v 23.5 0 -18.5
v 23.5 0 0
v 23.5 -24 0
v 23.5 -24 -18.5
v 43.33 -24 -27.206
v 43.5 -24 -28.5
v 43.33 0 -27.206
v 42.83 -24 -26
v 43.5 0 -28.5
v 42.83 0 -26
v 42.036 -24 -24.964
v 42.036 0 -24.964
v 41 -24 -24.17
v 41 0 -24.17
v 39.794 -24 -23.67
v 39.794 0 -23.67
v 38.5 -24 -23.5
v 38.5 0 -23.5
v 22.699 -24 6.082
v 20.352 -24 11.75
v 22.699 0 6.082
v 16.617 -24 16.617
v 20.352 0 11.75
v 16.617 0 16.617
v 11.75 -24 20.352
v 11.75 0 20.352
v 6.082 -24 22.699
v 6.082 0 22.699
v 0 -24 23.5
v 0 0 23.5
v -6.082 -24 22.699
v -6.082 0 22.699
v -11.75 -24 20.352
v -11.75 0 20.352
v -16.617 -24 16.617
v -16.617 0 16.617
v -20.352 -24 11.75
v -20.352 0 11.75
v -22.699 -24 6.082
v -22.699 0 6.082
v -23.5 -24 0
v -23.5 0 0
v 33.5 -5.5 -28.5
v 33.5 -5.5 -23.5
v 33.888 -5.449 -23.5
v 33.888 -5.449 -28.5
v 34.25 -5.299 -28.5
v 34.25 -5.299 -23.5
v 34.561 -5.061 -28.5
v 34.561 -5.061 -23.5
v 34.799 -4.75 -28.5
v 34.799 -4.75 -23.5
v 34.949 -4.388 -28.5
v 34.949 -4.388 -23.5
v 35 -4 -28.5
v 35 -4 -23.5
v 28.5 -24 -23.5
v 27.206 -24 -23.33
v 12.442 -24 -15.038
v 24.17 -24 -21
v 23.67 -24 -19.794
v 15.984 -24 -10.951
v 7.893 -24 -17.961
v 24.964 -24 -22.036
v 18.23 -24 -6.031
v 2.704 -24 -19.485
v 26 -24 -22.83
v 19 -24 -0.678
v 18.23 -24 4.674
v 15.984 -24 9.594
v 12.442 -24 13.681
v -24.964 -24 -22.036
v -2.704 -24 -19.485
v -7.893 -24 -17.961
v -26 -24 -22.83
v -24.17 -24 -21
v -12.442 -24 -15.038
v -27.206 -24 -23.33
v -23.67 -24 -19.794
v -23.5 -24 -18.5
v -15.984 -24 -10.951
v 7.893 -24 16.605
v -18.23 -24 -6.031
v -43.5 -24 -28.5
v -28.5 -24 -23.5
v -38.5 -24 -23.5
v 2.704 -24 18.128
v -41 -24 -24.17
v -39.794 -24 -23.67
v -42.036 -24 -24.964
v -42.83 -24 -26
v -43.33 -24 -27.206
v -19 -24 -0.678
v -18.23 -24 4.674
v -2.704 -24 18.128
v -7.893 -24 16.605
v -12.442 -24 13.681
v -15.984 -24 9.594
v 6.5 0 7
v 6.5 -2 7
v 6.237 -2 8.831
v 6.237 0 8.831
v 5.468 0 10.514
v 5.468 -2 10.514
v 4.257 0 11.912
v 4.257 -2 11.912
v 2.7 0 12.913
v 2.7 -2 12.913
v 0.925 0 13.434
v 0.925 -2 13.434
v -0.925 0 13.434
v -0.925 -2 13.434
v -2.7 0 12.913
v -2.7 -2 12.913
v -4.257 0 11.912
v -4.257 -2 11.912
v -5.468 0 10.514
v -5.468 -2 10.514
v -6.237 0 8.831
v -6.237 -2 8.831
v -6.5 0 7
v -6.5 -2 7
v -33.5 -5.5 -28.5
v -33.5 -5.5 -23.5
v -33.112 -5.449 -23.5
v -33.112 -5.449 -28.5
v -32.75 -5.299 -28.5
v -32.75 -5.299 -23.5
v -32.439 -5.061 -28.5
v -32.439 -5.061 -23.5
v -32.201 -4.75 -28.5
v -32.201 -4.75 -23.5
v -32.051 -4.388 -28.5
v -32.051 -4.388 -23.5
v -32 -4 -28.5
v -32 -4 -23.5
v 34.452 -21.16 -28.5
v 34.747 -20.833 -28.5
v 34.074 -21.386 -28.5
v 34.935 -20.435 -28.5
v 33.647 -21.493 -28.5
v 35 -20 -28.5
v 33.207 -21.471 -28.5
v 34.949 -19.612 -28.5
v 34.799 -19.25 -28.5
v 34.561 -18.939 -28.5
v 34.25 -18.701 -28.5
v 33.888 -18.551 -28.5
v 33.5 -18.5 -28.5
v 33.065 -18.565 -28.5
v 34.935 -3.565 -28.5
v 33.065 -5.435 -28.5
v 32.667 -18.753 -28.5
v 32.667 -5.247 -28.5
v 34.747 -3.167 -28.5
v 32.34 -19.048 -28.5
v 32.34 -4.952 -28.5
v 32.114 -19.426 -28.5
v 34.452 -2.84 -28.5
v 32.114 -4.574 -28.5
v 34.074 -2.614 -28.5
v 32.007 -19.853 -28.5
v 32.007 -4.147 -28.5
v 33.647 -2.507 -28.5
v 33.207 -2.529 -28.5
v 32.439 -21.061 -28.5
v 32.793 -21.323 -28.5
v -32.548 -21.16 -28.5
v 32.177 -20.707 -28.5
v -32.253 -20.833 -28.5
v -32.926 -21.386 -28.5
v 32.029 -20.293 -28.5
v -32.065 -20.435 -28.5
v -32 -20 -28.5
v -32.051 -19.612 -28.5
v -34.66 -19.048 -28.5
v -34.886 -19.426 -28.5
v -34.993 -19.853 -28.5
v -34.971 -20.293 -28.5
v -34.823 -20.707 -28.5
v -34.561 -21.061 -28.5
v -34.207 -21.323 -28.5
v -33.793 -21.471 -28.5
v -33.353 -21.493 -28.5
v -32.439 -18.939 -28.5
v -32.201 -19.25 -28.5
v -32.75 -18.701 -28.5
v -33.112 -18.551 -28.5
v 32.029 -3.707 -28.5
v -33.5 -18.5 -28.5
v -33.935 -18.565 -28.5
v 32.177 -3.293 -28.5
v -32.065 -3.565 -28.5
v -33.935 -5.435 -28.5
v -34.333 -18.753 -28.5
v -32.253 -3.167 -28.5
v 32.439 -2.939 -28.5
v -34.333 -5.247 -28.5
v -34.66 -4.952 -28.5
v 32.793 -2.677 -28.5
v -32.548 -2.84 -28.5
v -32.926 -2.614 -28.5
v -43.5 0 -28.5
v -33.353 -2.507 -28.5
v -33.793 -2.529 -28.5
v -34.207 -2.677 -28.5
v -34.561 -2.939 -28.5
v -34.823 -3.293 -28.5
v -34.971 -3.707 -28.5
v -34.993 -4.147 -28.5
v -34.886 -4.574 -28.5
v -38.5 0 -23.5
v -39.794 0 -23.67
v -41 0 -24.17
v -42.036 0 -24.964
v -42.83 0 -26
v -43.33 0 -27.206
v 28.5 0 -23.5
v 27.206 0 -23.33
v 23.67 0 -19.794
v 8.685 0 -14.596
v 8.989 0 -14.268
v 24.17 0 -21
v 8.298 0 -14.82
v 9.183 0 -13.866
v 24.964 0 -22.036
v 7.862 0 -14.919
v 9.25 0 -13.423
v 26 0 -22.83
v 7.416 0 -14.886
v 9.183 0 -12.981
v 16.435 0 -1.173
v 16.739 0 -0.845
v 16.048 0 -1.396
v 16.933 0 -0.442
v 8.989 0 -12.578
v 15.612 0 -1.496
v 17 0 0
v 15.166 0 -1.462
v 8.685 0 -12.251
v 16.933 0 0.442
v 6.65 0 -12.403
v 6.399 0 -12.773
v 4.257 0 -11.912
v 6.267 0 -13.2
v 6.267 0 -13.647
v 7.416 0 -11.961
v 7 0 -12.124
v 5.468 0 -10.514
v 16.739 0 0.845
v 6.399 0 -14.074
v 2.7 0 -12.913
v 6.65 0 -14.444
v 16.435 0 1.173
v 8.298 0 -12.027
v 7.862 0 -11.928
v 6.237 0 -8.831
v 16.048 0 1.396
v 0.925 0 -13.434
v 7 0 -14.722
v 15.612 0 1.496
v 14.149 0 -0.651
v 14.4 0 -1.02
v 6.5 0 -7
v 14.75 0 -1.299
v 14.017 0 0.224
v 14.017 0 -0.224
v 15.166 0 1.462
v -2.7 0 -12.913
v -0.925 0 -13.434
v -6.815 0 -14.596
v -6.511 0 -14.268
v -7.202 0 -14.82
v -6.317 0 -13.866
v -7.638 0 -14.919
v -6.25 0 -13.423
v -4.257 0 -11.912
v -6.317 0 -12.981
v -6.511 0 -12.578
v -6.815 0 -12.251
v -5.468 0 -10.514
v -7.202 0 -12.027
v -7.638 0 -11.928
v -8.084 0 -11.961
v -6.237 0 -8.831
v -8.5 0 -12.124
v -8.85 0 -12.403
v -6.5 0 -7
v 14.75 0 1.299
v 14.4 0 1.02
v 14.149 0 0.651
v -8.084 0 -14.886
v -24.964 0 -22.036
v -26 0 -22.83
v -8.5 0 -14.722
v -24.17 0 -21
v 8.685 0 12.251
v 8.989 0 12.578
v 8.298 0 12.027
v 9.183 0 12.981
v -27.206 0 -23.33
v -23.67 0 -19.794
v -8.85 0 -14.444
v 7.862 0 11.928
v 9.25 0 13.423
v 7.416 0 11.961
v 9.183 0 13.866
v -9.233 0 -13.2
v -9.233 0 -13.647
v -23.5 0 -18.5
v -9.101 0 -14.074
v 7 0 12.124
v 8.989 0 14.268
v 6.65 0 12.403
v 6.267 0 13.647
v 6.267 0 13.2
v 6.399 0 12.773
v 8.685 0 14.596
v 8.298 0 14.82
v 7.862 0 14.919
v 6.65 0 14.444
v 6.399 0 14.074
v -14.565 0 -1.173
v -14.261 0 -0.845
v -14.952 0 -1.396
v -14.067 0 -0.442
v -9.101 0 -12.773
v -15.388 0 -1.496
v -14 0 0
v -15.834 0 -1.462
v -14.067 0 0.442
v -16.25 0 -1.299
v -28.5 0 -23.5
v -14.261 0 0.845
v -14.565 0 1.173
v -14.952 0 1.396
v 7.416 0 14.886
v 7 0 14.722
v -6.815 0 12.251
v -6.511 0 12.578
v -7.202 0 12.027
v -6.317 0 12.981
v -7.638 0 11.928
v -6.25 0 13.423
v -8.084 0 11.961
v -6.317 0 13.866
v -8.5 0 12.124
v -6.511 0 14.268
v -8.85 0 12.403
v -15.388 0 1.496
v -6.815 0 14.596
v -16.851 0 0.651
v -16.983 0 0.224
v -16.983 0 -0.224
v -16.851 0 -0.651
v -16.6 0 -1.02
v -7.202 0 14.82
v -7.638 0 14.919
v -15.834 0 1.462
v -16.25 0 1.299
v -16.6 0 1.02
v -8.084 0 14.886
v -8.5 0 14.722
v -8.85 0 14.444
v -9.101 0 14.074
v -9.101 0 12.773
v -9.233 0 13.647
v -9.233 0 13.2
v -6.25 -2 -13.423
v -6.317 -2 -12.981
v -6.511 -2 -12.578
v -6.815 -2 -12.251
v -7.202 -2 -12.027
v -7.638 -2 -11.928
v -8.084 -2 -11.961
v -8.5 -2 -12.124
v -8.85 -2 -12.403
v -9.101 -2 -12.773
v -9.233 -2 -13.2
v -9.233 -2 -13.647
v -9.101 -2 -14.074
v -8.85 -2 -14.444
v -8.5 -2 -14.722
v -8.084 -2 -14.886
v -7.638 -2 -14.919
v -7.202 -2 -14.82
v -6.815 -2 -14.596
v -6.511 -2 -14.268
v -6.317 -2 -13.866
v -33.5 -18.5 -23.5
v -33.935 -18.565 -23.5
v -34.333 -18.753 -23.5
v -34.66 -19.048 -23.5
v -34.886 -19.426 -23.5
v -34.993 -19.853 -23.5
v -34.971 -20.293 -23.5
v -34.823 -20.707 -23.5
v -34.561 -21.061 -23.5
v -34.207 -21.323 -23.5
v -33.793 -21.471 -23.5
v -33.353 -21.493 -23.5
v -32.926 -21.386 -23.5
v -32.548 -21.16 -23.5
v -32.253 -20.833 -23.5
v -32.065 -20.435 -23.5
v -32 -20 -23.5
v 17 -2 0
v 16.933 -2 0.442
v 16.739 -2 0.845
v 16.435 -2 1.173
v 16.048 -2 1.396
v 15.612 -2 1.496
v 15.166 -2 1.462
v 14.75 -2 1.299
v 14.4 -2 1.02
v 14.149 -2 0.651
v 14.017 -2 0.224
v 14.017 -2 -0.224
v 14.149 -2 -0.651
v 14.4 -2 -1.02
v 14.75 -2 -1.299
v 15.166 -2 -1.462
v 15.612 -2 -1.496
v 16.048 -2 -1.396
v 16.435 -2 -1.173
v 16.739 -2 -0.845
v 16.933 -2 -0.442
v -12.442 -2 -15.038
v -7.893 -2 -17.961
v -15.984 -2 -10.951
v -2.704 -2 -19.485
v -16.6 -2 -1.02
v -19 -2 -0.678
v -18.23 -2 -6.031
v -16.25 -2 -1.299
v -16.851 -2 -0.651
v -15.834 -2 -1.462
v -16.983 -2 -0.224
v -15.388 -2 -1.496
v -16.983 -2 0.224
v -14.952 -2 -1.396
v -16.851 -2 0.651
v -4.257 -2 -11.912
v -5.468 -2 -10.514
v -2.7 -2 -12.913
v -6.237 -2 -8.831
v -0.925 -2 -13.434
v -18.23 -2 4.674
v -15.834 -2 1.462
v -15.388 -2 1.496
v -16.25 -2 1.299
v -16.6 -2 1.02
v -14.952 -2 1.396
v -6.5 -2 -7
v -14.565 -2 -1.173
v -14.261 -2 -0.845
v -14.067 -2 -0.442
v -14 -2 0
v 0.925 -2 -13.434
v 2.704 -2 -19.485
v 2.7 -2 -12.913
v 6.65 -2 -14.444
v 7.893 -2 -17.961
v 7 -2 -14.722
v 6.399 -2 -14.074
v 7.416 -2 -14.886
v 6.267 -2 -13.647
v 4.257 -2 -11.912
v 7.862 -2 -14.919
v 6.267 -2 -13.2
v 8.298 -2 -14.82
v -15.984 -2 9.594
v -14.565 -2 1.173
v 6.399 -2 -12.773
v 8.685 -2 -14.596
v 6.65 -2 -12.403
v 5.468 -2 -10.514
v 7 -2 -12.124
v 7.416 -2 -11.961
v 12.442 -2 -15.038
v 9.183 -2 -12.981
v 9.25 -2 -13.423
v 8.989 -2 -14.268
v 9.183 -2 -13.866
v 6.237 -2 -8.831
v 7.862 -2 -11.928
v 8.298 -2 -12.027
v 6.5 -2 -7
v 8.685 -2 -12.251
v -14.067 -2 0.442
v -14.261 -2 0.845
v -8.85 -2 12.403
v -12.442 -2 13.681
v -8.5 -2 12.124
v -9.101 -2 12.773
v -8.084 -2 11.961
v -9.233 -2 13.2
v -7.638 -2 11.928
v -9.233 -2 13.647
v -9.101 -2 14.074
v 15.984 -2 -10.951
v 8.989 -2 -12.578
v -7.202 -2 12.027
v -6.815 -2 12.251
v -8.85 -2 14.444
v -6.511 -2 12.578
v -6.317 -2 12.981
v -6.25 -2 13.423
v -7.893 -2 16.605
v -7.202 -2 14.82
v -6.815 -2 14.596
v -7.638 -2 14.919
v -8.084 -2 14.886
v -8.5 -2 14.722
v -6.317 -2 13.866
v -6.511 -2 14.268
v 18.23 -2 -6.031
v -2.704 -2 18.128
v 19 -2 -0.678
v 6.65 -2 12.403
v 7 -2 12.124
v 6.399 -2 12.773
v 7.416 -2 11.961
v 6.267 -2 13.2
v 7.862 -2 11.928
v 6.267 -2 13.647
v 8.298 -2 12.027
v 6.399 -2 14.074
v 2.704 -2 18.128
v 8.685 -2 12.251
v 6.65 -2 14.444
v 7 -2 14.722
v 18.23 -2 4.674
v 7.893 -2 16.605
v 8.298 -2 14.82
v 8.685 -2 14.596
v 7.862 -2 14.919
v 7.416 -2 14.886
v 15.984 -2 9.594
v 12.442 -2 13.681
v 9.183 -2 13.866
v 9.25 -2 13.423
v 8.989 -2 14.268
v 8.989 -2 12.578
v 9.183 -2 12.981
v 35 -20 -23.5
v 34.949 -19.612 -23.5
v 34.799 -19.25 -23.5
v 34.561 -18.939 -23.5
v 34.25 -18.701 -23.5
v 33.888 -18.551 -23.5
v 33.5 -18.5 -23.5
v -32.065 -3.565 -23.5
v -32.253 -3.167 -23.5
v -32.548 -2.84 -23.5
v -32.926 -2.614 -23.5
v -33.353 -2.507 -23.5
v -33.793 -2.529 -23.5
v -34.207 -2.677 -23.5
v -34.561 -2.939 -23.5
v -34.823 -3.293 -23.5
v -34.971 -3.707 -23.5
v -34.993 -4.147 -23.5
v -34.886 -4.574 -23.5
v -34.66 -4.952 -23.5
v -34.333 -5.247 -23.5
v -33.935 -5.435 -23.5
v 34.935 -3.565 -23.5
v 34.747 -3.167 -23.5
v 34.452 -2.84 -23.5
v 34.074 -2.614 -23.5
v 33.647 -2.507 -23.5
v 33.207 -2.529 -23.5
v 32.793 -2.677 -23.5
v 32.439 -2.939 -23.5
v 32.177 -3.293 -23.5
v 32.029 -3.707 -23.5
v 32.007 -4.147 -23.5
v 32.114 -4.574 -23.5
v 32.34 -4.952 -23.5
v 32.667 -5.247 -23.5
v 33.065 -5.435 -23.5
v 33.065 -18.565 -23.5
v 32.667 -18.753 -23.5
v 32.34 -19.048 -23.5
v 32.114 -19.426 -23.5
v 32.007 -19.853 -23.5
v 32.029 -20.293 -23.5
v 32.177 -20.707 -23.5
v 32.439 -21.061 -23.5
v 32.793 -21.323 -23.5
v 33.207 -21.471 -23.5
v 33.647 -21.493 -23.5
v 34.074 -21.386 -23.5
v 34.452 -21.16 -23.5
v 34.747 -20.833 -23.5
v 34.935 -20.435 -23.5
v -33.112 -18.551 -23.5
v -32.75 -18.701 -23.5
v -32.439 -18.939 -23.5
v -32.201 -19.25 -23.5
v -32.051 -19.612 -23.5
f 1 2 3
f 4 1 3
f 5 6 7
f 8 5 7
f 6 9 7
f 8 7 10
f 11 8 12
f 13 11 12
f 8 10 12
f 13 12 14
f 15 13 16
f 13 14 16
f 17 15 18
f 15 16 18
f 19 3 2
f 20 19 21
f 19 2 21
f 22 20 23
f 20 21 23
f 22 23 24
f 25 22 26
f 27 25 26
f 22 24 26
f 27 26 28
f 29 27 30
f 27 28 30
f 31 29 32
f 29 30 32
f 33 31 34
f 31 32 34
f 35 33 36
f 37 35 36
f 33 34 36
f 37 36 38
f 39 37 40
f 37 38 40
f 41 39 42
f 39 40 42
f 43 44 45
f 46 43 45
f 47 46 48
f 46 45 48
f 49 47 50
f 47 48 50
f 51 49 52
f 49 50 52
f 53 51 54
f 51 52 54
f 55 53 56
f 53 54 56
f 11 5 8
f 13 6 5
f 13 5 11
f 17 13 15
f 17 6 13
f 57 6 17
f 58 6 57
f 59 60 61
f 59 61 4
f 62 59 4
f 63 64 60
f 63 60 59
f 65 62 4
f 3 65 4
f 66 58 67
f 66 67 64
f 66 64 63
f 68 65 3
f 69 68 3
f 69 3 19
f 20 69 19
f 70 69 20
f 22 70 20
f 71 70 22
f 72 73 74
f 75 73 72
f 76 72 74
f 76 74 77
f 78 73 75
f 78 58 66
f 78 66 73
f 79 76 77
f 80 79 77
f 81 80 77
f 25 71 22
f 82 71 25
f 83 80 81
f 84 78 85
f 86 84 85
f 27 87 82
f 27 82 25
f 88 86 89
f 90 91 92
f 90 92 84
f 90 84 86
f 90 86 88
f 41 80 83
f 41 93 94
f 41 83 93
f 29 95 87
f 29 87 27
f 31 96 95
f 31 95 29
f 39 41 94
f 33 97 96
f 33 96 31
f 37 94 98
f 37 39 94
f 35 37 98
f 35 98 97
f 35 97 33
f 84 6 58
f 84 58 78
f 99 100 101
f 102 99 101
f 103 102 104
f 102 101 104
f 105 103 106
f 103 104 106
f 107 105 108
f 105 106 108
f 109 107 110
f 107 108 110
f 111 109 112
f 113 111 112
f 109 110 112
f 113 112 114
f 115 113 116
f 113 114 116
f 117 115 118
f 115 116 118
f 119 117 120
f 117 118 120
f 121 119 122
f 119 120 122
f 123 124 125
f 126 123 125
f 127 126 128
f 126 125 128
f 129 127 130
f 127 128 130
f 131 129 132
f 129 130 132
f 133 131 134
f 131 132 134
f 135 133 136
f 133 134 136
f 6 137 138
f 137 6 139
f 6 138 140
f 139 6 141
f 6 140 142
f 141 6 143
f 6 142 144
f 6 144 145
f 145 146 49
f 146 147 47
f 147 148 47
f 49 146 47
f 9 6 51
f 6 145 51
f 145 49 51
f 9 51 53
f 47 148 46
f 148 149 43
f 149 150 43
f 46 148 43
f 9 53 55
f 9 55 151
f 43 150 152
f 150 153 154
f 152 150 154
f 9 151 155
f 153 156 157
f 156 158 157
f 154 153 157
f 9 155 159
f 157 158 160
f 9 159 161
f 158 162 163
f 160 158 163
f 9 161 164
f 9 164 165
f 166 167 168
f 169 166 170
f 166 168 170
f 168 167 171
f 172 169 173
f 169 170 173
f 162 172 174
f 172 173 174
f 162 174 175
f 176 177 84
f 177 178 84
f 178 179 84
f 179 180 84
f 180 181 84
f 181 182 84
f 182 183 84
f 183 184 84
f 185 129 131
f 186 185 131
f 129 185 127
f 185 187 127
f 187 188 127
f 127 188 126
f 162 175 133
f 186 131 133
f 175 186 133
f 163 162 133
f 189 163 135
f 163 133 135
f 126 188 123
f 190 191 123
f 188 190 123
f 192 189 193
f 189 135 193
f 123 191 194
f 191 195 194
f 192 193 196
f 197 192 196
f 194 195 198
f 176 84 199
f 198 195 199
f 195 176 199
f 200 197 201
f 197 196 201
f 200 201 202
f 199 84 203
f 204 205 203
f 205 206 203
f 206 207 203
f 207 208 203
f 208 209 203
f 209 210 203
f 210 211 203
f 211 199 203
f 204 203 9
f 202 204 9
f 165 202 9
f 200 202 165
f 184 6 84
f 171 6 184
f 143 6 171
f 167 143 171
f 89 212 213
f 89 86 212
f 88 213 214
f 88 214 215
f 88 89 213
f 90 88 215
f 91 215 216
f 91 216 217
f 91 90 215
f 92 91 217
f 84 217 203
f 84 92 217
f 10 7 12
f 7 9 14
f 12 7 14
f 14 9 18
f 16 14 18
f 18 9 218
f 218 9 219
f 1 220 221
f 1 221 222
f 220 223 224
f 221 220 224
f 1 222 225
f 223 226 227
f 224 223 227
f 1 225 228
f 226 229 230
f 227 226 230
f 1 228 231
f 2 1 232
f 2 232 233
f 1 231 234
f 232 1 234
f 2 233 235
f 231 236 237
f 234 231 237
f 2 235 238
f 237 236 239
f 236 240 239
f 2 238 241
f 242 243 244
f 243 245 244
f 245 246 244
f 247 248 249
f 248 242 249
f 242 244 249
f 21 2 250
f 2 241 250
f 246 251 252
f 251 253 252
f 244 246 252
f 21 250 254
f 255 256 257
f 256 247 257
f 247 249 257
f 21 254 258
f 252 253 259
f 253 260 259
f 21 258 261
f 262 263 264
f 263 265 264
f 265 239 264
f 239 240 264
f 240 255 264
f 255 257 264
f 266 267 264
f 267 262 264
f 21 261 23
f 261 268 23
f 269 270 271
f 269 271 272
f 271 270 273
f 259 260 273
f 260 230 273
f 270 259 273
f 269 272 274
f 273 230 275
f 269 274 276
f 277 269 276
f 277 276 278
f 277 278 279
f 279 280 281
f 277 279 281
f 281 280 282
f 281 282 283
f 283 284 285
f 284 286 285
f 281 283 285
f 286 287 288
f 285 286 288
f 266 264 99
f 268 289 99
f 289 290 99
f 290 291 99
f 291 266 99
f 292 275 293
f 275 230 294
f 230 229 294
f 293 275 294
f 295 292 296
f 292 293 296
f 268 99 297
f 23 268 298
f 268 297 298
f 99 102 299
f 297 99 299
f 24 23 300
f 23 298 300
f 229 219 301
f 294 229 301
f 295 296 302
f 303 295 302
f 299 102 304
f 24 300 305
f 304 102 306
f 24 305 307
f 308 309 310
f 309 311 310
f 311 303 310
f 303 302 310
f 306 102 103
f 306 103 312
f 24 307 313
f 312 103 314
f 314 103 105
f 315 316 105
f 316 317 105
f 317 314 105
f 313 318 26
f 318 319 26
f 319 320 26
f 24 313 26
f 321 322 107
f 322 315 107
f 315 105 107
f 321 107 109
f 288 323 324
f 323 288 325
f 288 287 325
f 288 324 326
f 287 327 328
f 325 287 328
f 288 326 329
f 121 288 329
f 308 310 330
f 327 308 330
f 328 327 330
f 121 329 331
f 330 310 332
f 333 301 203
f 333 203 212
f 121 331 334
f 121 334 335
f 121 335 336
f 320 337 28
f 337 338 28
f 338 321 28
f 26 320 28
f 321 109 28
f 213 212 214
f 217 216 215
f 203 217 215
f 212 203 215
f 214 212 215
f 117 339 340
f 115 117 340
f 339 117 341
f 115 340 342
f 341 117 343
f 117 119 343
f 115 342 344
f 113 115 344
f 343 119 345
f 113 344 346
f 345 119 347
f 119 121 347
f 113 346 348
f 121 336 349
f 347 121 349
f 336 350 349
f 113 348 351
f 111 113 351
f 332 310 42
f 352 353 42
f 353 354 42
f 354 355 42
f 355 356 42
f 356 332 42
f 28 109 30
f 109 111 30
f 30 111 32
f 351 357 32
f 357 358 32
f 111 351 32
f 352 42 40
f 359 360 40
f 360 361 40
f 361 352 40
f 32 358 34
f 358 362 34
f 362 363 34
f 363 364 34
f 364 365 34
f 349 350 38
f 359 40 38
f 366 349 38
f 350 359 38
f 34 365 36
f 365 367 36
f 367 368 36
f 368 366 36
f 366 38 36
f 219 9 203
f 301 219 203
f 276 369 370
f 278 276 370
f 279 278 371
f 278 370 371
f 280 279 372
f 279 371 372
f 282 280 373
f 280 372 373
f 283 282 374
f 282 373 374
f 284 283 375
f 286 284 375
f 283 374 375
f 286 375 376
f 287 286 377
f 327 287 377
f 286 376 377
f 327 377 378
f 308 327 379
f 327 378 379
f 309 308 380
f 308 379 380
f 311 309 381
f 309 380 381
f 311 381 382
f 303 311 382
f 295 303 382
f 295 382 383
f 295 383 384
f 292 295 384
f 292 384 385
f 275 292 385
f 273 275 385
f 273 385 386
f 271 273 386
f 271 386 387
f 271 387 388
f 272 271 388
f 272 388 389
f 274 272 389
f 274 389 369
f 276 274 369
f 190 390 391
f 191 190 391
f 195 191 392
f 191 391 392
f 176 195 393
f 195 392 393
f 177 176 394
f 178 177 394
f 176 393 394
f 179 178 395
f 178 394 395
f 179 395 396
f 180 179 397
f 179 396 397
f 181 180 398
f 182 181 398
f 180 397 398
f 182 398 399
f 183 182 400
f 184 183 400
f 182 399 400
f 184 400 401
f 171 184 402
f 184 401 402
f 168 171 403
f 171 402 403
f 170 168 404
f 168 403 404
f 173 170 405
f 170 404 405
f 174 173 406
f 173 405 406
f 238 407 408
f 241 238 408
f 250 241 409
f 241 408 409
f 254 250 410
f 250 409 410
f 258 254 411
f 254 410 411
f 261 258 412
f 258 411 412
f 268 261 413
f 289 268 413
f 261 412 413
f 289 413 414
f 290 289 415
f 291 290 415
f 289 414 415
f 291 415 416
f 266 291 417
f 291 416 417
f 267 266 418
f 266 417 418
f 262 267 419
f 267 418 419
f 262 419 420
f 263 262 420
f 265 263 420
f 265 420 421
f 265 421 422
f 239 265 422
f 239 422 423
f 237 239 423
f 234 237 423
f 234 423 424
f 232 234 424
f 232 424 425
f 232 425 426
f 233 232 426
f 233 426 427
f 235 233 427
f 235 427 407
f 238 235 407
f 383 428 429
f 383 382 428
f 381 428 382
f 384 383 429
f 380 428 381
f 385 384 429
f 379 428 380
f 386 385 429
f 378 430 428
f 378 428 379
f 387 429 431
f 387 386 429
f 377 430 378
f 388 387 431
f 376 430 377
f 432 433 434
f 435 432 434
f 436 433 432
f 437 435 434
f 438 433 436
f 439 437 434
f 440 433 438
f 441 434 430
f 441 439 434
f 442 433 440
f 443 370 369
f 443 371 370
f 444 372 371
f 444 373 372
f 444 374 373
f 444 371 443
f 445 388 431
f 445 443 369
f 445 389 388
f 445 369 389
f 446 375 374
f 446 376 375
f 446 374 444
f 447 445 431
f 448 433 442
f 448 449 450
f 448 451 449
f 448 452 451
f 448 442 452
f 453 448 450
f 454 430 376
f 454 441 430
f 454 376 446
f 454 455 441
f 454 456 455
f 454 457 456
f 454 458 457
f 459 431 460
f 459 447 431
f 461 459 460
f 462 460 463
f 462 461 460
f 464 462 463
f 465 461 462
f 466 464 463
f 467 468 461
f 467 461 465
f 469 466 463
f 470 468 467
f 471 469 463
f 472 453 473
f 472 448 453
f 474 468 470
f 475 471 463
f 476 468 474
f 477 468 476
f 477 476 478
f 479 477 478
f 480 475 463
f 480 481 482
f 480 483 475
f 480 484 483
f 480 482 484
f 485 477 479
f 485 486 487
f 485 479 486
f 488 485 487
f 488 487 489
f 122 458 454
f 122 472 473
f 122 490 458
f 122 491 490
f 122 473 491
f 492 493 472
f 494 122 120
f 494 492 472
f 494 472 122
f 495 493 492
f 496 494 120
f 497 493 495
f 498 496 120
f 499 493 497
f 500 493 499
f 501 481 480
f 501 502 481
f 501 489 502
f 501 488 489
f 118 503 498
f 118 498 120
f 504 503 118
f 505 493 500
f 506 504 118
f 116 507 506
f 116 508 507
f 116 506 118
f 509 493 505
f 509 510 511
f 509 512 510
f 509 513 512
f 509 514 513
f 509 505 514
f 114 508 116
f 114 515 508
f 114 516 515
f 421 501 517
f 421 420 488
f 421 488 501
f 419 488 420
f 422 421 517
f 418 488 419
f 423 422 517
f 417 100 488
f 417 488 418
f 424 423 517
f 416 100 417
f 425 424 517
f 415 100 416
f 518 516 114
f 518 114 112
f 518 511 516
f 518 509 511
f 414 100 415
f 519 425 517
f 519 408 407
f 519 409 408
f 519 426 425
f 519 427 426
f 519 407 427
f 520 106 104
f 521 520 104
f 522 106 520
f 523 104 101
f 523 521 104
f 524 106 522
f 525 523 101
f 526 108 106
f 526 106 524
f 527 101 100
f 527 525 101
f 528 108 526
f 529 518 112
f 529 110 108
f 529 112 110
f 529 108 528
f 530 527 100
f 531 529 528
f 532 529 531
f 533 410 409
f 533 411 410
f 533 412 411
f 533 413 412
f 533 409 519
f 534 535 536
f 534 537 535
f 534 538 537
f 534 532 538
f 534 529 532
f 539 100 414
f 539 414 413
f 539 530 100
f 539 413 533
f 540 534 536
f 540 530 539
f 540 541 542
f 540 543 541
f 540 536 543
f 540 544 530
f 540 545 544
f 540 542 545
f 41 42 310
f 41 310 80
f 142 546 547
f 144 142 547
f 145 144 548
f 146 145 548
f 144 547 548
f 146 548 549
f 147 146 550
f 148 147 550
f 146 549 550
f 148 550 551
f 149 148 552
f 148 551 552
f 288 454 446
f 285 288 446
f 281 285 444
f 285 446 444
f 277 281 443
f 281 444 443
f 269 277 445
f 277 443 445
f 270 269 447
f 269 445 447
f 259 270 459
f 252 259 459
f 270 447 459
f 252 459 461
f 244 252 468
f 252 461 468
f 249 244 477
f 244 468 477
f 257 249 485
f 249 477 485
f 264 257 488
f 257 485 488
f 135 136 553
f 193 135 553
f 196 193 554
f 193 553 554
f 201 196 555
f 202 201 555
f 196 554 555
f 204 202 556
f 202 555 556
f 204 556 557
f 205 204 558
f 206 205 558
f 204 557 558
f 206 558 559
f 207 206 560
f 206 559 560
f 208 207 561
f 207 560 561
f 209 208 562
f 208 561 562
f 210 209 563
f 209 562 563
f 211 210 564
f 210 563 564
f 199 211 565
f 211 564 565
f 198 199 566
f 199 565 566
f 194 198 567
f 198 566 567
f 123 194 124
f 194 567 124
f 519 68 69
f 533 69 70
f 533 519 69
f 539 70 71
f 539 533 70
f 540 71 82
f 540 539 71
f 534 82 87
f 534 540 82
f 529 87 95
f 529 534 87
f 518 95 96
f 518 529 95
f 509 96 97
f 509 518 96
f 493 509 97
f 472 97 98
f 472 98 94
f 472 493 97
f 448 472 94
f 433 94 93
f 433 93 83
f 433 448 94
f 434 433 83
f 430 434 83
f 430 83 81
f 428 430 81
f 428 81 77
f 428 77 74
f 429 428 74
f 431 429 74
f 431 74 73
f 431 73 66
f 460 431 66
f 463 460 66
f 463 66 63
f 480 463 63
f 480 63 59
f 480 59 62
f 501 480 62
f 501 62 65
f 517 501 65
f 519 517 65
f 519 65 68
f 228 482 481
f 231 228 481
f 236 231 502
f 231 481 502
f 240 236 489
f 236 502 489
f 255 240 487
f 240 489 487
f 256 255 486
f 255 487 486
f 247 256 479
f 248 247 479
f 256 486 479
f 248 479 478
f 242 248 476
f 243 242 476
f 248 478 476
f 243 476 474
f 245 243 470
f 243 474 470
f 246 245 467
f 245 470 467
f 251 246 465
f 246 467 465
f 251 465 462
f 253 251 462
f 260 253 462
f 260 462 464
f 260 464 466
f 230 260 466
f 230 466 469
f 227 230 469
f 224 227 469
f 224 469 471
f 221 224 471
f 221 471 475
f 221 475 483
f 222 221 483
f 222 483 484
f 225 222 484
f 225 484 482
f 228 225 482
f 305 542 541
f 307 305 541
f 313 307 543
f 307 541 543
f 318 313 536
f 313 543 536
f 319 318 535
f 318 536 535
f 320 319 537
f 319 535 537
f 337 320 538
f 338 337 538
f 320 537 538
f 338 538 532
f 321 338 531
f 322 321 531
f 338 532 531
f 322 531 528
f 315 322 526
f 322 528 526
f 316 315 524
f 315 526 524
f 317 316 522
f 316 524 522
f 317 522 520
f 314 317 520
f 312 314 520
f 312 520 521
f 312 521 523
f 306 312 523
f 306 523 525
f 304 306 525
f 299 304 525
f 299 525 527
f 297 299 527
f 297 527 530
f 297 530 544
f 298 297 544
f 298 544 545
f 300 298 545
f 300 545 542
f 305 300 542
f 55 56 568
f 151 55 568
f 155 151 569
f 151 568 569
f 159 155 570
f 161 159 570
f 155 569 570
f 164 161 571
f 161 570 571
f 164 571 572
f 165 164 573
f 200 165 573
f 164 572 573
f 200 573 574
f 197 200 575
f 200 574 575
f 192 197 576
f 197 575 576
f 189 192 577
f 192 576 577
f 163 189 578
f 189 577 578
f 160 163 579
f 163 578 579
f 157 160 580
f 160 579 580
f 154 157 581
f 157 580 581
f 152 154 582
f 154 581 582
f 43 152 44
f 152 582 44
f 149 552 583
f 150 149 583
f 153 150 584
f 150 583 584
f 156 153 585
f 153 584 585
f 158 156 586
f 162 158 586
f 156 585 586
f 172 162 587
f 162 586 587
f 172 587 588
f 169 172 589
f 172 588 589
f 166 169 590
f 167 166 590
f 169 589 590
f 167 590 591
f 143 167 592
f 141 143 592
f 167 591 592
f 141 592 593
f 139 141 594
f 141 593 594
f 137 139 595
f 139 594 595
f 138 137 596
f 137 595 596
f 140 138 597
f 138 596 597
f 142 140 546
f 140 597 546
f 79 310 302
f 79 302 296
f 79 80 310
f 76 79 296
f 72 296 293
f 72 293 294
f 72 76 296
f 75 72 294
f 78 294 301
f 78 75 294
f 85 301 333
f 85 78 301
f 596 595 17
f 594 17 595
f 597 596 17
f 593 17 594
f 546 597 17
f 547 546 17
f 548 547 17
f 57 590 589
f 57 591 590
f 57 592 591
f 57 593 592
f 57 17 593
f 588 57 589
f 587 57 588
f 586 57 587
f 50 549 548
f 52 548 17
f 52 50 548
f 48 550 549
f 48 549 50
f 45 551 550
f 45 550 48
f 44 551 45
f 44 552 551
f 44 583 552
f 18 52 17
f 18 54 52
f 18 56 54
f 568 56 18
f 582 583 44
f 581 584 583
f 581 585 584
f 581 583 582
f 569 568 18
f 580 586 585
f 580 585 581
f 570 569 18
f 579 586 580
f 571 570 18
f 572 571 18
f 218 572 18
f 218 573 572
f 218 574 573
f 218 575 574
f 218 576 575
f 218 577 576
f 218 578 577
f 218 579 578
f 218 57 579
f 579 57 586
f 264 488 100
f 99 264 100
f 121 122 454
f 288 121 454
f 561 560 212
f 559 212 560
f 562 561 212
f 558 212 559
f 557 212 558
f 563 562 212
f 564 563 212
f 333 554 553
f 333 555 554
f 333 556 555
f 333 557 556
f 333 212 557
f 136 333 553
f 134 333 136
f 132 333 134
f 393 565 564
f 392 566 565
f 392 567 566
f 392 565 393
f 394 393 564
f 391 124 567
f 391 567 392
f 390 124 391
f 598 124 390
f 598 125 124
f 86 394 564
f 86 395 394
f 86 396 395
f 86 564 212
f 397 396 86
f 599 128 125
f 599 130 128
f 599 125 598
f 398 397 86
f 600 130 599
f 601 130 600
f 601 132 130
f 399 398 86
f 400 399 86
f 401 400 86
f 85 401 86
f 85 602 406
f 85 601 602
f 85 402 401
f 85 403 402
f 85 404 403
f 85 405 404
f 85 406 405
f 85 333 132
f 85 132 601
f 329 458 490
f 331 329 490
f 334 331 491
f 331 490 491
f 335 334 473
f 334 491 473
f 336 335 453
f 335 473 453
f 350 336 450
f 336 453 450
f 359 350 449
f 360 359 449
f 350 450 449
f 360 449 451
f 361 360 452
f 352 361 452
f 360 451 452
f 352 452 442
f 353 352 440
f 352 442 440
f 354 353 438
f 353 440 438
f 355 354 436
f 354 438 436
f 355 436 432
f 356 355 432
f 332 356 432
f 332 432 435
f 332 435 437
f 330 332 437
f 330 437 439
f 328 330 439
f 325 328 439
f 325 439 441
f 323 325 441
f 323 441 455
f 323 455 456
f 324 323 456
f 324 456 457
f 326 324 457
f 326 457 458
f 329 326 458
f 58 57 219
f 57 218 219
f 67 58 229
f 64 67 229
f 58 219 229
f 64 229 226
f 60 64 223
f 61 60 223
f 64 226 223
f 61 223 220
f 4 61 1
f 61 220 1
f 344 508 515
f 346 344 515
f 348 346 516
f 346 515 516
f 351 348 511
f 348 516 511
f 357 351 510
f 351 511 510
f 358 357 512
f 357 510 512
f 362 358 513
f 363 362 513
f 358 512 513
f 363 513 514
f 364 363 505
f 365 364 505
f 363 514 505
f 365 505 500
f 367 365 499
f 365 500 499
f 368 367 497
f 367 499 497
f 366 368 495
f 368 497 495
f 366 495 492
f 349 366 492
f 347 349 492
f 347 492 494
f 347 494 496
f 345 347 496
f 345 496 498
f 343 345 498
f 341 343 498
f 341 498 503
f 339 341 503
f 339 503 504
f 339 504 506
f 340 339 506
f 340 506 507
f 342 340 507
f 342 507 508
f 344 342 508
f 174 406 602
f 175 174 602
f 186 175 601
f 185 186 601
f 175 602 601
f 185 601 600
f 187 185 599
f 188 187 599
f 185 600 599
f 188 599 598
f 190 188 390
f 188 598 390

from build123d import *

# Parameters (mm, degrees)
F1_DEPTH  = 2
F2_R      = 1.5
F3_DEPTH  = 5
F4_R      = 19
F5_DEPTH  = 24
F6_W      = 47
F6_H      = 24
F7_DEPTH  = 5
F8_W      = 24
F8_H      = 5
F9_DEPTH  = 20
F11_DEPTH = 25
F12_W     = 24
F12_H     = 5
F13_DEPTH = 20
F15_DEPTH = 25
F16_R     = 4.99999


# Not quite as in the source:
# - a fillet or chamfer is up to 0.001 mm smaller than in the source, because OpenCascade refuses the exact size


with BuildPart() as f1:
    # F0 (on Front) → F1 (new body)
    with BuildSketch(Plane.XZ):
        with BuildLine():
            Line((-23.5, -23.5), (0, -23.5))
            Line((0, -23.5), (23.5, -23.5))
            Line((23.5, -23.5), (23.5, 0))
            ThreePointArc((23.5, 0), (0, 23.5), (-23.5, 0))
            Line((-23.5, 0), (-23.5, -23.5))
        make_face()
    extrude(amount=F1_DEPTH)

    # F2 (on face) → F3 (cut)
    with BuildSketch(Plane.XZ.offset(2)):
        with Locations((15.5, 0)):
            Circle(F2_R)
        with Locations((7.75, 13.4233937587)):
            Circle(F2_R)
        with Locations((-7.75, 13.4233937587)):
            Circle(F2_R)
        with Locations((-15.5, 0)):
            Circle(F2_R)
        with Locations((-7.75, -13.4233937587)):
            Circle(F2_R)
        with Locations((7.75, -13.4233937587)):
            Circle(F2_R)
        with BuildLine():
            Line((6.5, -7), (6.5, 7))
            ThreePointArc((6.5, 7), (0, 13.5), (-6.5, 7))
            Line((-6.5, 7), (-6.5, -7))
            ThreePointArc((-6.5, -7), (0, -13.5), (6.5, -7))
        make_face()
    extrude(amount=-F3_DEPTH, mode=Mode.SUBTRACT)

    # F4 (on Front) → F5 (join)
    with BuildSketch(Plane.XZ):
        with BuildLine():
            ThreePointArc((23.5, 0), (0, 23.5), (-23.5, 0))
            Line((-23.5, 0), (-23.5, -23.5))
            Line((-23.5, -23.5), (23.5, -23.5))
            Line((23.5, -23.5), (23.5, 0))
        make_face()
        with Locations((0, -0.6784388353)):
            Circle(F4_R, mode=Mode.SUBTRACT)
    extrude(amount=F5_DEPTH)

    # F6 (on face) → F7 (join)
    with BuildSketch(Plane(origin=(0, 0, -23.5), x_dir=(1, 0, 0), z_dir=(0, 0, -1))):
        with Locations((0, 12)):
            Rectangle(F6_W, F6_H)
    extrude(amount=F7_DEPTH)

    # F8 (on face) → F9 (join)
    with BuildSketch(Plane(origin=(-23.5, 0, 0), x_dir=(0, -1, 0), z_dir=(-1, 0, 0))):
        with Locations((12, -26)):
            Rectangle(F8_W, F8_H)
    extrude(amount=F9_DEPTH)

    # F10 (on face) → F11 (cut)
    with BuildSketch(Plane.XY.offset(-23.5)):
        with BuildLine():
            ThreePointArc((-32, -4), (-34.5606601718, -2.9393398282), (-33.5, -5.5))
            ThreePointArc((-33.5, -5.5), (-32.4393398282, -5.0606601718), (-32, -4))
        make_face()
        with BuildLine():
            ThreePointArc((-32, -20), (-32.4393398282, -18.9393398282), (-33.5, -18.5))
            ThreePointArc((-33.5, -18.5), (-34.5606601718, -21.0606601718), (-32, -20))
        make_face()
    extrude(amount=-F11_DEPTH, mode=Mode.SUBTRACT)

    # F12 (on face) → F13 (join)
    with BuildSketch(Plane.YZ.offset(23.5)):
        with Locations((-12, -26)):
            Rectangle(F12_W, F12_H)
    extrude(amount=F13_DEPTH)

    # F14 (on face) → F15 (cut)
    with BuildSketch(Plane.XY.offset(-23.5)):
        with BuildLine():
            ThreePointArc((35, -4), (32.4393398282, -2.9393398282), (33.5, -5.5))
            ThreePointArc((33.5, -5.5), (34.5606601718, -5.0606601718), (35, -4))
        make_face()
        with BuildLine():
            ThreePointArc((35, -20), (34.5606601718, -18.9393398282), (33.5, -18.5))
            ThreePointArc((33.5, -18.5), (32.4393398282, -21.0606601718), (35, -20))
        make_face()
    extrude(amount=-F15_DEPTH, mode=Mode.SUBTRACT)

    # F16 (radius 5 in the source; OpenCascade refuses exactly that, so slightly less here)
    f16_edges = [f1.edges().sort_by_distance(p)[0] for p in [
        (23.5, -12, -23.5),
        (43.5, -12, -23.5),
        (-23.5, -12, -23.5),
        (-43.5, -12, -23.5),
    ]]
    fillet(f16_edges, radius=F16_R)


solid = f1.part
